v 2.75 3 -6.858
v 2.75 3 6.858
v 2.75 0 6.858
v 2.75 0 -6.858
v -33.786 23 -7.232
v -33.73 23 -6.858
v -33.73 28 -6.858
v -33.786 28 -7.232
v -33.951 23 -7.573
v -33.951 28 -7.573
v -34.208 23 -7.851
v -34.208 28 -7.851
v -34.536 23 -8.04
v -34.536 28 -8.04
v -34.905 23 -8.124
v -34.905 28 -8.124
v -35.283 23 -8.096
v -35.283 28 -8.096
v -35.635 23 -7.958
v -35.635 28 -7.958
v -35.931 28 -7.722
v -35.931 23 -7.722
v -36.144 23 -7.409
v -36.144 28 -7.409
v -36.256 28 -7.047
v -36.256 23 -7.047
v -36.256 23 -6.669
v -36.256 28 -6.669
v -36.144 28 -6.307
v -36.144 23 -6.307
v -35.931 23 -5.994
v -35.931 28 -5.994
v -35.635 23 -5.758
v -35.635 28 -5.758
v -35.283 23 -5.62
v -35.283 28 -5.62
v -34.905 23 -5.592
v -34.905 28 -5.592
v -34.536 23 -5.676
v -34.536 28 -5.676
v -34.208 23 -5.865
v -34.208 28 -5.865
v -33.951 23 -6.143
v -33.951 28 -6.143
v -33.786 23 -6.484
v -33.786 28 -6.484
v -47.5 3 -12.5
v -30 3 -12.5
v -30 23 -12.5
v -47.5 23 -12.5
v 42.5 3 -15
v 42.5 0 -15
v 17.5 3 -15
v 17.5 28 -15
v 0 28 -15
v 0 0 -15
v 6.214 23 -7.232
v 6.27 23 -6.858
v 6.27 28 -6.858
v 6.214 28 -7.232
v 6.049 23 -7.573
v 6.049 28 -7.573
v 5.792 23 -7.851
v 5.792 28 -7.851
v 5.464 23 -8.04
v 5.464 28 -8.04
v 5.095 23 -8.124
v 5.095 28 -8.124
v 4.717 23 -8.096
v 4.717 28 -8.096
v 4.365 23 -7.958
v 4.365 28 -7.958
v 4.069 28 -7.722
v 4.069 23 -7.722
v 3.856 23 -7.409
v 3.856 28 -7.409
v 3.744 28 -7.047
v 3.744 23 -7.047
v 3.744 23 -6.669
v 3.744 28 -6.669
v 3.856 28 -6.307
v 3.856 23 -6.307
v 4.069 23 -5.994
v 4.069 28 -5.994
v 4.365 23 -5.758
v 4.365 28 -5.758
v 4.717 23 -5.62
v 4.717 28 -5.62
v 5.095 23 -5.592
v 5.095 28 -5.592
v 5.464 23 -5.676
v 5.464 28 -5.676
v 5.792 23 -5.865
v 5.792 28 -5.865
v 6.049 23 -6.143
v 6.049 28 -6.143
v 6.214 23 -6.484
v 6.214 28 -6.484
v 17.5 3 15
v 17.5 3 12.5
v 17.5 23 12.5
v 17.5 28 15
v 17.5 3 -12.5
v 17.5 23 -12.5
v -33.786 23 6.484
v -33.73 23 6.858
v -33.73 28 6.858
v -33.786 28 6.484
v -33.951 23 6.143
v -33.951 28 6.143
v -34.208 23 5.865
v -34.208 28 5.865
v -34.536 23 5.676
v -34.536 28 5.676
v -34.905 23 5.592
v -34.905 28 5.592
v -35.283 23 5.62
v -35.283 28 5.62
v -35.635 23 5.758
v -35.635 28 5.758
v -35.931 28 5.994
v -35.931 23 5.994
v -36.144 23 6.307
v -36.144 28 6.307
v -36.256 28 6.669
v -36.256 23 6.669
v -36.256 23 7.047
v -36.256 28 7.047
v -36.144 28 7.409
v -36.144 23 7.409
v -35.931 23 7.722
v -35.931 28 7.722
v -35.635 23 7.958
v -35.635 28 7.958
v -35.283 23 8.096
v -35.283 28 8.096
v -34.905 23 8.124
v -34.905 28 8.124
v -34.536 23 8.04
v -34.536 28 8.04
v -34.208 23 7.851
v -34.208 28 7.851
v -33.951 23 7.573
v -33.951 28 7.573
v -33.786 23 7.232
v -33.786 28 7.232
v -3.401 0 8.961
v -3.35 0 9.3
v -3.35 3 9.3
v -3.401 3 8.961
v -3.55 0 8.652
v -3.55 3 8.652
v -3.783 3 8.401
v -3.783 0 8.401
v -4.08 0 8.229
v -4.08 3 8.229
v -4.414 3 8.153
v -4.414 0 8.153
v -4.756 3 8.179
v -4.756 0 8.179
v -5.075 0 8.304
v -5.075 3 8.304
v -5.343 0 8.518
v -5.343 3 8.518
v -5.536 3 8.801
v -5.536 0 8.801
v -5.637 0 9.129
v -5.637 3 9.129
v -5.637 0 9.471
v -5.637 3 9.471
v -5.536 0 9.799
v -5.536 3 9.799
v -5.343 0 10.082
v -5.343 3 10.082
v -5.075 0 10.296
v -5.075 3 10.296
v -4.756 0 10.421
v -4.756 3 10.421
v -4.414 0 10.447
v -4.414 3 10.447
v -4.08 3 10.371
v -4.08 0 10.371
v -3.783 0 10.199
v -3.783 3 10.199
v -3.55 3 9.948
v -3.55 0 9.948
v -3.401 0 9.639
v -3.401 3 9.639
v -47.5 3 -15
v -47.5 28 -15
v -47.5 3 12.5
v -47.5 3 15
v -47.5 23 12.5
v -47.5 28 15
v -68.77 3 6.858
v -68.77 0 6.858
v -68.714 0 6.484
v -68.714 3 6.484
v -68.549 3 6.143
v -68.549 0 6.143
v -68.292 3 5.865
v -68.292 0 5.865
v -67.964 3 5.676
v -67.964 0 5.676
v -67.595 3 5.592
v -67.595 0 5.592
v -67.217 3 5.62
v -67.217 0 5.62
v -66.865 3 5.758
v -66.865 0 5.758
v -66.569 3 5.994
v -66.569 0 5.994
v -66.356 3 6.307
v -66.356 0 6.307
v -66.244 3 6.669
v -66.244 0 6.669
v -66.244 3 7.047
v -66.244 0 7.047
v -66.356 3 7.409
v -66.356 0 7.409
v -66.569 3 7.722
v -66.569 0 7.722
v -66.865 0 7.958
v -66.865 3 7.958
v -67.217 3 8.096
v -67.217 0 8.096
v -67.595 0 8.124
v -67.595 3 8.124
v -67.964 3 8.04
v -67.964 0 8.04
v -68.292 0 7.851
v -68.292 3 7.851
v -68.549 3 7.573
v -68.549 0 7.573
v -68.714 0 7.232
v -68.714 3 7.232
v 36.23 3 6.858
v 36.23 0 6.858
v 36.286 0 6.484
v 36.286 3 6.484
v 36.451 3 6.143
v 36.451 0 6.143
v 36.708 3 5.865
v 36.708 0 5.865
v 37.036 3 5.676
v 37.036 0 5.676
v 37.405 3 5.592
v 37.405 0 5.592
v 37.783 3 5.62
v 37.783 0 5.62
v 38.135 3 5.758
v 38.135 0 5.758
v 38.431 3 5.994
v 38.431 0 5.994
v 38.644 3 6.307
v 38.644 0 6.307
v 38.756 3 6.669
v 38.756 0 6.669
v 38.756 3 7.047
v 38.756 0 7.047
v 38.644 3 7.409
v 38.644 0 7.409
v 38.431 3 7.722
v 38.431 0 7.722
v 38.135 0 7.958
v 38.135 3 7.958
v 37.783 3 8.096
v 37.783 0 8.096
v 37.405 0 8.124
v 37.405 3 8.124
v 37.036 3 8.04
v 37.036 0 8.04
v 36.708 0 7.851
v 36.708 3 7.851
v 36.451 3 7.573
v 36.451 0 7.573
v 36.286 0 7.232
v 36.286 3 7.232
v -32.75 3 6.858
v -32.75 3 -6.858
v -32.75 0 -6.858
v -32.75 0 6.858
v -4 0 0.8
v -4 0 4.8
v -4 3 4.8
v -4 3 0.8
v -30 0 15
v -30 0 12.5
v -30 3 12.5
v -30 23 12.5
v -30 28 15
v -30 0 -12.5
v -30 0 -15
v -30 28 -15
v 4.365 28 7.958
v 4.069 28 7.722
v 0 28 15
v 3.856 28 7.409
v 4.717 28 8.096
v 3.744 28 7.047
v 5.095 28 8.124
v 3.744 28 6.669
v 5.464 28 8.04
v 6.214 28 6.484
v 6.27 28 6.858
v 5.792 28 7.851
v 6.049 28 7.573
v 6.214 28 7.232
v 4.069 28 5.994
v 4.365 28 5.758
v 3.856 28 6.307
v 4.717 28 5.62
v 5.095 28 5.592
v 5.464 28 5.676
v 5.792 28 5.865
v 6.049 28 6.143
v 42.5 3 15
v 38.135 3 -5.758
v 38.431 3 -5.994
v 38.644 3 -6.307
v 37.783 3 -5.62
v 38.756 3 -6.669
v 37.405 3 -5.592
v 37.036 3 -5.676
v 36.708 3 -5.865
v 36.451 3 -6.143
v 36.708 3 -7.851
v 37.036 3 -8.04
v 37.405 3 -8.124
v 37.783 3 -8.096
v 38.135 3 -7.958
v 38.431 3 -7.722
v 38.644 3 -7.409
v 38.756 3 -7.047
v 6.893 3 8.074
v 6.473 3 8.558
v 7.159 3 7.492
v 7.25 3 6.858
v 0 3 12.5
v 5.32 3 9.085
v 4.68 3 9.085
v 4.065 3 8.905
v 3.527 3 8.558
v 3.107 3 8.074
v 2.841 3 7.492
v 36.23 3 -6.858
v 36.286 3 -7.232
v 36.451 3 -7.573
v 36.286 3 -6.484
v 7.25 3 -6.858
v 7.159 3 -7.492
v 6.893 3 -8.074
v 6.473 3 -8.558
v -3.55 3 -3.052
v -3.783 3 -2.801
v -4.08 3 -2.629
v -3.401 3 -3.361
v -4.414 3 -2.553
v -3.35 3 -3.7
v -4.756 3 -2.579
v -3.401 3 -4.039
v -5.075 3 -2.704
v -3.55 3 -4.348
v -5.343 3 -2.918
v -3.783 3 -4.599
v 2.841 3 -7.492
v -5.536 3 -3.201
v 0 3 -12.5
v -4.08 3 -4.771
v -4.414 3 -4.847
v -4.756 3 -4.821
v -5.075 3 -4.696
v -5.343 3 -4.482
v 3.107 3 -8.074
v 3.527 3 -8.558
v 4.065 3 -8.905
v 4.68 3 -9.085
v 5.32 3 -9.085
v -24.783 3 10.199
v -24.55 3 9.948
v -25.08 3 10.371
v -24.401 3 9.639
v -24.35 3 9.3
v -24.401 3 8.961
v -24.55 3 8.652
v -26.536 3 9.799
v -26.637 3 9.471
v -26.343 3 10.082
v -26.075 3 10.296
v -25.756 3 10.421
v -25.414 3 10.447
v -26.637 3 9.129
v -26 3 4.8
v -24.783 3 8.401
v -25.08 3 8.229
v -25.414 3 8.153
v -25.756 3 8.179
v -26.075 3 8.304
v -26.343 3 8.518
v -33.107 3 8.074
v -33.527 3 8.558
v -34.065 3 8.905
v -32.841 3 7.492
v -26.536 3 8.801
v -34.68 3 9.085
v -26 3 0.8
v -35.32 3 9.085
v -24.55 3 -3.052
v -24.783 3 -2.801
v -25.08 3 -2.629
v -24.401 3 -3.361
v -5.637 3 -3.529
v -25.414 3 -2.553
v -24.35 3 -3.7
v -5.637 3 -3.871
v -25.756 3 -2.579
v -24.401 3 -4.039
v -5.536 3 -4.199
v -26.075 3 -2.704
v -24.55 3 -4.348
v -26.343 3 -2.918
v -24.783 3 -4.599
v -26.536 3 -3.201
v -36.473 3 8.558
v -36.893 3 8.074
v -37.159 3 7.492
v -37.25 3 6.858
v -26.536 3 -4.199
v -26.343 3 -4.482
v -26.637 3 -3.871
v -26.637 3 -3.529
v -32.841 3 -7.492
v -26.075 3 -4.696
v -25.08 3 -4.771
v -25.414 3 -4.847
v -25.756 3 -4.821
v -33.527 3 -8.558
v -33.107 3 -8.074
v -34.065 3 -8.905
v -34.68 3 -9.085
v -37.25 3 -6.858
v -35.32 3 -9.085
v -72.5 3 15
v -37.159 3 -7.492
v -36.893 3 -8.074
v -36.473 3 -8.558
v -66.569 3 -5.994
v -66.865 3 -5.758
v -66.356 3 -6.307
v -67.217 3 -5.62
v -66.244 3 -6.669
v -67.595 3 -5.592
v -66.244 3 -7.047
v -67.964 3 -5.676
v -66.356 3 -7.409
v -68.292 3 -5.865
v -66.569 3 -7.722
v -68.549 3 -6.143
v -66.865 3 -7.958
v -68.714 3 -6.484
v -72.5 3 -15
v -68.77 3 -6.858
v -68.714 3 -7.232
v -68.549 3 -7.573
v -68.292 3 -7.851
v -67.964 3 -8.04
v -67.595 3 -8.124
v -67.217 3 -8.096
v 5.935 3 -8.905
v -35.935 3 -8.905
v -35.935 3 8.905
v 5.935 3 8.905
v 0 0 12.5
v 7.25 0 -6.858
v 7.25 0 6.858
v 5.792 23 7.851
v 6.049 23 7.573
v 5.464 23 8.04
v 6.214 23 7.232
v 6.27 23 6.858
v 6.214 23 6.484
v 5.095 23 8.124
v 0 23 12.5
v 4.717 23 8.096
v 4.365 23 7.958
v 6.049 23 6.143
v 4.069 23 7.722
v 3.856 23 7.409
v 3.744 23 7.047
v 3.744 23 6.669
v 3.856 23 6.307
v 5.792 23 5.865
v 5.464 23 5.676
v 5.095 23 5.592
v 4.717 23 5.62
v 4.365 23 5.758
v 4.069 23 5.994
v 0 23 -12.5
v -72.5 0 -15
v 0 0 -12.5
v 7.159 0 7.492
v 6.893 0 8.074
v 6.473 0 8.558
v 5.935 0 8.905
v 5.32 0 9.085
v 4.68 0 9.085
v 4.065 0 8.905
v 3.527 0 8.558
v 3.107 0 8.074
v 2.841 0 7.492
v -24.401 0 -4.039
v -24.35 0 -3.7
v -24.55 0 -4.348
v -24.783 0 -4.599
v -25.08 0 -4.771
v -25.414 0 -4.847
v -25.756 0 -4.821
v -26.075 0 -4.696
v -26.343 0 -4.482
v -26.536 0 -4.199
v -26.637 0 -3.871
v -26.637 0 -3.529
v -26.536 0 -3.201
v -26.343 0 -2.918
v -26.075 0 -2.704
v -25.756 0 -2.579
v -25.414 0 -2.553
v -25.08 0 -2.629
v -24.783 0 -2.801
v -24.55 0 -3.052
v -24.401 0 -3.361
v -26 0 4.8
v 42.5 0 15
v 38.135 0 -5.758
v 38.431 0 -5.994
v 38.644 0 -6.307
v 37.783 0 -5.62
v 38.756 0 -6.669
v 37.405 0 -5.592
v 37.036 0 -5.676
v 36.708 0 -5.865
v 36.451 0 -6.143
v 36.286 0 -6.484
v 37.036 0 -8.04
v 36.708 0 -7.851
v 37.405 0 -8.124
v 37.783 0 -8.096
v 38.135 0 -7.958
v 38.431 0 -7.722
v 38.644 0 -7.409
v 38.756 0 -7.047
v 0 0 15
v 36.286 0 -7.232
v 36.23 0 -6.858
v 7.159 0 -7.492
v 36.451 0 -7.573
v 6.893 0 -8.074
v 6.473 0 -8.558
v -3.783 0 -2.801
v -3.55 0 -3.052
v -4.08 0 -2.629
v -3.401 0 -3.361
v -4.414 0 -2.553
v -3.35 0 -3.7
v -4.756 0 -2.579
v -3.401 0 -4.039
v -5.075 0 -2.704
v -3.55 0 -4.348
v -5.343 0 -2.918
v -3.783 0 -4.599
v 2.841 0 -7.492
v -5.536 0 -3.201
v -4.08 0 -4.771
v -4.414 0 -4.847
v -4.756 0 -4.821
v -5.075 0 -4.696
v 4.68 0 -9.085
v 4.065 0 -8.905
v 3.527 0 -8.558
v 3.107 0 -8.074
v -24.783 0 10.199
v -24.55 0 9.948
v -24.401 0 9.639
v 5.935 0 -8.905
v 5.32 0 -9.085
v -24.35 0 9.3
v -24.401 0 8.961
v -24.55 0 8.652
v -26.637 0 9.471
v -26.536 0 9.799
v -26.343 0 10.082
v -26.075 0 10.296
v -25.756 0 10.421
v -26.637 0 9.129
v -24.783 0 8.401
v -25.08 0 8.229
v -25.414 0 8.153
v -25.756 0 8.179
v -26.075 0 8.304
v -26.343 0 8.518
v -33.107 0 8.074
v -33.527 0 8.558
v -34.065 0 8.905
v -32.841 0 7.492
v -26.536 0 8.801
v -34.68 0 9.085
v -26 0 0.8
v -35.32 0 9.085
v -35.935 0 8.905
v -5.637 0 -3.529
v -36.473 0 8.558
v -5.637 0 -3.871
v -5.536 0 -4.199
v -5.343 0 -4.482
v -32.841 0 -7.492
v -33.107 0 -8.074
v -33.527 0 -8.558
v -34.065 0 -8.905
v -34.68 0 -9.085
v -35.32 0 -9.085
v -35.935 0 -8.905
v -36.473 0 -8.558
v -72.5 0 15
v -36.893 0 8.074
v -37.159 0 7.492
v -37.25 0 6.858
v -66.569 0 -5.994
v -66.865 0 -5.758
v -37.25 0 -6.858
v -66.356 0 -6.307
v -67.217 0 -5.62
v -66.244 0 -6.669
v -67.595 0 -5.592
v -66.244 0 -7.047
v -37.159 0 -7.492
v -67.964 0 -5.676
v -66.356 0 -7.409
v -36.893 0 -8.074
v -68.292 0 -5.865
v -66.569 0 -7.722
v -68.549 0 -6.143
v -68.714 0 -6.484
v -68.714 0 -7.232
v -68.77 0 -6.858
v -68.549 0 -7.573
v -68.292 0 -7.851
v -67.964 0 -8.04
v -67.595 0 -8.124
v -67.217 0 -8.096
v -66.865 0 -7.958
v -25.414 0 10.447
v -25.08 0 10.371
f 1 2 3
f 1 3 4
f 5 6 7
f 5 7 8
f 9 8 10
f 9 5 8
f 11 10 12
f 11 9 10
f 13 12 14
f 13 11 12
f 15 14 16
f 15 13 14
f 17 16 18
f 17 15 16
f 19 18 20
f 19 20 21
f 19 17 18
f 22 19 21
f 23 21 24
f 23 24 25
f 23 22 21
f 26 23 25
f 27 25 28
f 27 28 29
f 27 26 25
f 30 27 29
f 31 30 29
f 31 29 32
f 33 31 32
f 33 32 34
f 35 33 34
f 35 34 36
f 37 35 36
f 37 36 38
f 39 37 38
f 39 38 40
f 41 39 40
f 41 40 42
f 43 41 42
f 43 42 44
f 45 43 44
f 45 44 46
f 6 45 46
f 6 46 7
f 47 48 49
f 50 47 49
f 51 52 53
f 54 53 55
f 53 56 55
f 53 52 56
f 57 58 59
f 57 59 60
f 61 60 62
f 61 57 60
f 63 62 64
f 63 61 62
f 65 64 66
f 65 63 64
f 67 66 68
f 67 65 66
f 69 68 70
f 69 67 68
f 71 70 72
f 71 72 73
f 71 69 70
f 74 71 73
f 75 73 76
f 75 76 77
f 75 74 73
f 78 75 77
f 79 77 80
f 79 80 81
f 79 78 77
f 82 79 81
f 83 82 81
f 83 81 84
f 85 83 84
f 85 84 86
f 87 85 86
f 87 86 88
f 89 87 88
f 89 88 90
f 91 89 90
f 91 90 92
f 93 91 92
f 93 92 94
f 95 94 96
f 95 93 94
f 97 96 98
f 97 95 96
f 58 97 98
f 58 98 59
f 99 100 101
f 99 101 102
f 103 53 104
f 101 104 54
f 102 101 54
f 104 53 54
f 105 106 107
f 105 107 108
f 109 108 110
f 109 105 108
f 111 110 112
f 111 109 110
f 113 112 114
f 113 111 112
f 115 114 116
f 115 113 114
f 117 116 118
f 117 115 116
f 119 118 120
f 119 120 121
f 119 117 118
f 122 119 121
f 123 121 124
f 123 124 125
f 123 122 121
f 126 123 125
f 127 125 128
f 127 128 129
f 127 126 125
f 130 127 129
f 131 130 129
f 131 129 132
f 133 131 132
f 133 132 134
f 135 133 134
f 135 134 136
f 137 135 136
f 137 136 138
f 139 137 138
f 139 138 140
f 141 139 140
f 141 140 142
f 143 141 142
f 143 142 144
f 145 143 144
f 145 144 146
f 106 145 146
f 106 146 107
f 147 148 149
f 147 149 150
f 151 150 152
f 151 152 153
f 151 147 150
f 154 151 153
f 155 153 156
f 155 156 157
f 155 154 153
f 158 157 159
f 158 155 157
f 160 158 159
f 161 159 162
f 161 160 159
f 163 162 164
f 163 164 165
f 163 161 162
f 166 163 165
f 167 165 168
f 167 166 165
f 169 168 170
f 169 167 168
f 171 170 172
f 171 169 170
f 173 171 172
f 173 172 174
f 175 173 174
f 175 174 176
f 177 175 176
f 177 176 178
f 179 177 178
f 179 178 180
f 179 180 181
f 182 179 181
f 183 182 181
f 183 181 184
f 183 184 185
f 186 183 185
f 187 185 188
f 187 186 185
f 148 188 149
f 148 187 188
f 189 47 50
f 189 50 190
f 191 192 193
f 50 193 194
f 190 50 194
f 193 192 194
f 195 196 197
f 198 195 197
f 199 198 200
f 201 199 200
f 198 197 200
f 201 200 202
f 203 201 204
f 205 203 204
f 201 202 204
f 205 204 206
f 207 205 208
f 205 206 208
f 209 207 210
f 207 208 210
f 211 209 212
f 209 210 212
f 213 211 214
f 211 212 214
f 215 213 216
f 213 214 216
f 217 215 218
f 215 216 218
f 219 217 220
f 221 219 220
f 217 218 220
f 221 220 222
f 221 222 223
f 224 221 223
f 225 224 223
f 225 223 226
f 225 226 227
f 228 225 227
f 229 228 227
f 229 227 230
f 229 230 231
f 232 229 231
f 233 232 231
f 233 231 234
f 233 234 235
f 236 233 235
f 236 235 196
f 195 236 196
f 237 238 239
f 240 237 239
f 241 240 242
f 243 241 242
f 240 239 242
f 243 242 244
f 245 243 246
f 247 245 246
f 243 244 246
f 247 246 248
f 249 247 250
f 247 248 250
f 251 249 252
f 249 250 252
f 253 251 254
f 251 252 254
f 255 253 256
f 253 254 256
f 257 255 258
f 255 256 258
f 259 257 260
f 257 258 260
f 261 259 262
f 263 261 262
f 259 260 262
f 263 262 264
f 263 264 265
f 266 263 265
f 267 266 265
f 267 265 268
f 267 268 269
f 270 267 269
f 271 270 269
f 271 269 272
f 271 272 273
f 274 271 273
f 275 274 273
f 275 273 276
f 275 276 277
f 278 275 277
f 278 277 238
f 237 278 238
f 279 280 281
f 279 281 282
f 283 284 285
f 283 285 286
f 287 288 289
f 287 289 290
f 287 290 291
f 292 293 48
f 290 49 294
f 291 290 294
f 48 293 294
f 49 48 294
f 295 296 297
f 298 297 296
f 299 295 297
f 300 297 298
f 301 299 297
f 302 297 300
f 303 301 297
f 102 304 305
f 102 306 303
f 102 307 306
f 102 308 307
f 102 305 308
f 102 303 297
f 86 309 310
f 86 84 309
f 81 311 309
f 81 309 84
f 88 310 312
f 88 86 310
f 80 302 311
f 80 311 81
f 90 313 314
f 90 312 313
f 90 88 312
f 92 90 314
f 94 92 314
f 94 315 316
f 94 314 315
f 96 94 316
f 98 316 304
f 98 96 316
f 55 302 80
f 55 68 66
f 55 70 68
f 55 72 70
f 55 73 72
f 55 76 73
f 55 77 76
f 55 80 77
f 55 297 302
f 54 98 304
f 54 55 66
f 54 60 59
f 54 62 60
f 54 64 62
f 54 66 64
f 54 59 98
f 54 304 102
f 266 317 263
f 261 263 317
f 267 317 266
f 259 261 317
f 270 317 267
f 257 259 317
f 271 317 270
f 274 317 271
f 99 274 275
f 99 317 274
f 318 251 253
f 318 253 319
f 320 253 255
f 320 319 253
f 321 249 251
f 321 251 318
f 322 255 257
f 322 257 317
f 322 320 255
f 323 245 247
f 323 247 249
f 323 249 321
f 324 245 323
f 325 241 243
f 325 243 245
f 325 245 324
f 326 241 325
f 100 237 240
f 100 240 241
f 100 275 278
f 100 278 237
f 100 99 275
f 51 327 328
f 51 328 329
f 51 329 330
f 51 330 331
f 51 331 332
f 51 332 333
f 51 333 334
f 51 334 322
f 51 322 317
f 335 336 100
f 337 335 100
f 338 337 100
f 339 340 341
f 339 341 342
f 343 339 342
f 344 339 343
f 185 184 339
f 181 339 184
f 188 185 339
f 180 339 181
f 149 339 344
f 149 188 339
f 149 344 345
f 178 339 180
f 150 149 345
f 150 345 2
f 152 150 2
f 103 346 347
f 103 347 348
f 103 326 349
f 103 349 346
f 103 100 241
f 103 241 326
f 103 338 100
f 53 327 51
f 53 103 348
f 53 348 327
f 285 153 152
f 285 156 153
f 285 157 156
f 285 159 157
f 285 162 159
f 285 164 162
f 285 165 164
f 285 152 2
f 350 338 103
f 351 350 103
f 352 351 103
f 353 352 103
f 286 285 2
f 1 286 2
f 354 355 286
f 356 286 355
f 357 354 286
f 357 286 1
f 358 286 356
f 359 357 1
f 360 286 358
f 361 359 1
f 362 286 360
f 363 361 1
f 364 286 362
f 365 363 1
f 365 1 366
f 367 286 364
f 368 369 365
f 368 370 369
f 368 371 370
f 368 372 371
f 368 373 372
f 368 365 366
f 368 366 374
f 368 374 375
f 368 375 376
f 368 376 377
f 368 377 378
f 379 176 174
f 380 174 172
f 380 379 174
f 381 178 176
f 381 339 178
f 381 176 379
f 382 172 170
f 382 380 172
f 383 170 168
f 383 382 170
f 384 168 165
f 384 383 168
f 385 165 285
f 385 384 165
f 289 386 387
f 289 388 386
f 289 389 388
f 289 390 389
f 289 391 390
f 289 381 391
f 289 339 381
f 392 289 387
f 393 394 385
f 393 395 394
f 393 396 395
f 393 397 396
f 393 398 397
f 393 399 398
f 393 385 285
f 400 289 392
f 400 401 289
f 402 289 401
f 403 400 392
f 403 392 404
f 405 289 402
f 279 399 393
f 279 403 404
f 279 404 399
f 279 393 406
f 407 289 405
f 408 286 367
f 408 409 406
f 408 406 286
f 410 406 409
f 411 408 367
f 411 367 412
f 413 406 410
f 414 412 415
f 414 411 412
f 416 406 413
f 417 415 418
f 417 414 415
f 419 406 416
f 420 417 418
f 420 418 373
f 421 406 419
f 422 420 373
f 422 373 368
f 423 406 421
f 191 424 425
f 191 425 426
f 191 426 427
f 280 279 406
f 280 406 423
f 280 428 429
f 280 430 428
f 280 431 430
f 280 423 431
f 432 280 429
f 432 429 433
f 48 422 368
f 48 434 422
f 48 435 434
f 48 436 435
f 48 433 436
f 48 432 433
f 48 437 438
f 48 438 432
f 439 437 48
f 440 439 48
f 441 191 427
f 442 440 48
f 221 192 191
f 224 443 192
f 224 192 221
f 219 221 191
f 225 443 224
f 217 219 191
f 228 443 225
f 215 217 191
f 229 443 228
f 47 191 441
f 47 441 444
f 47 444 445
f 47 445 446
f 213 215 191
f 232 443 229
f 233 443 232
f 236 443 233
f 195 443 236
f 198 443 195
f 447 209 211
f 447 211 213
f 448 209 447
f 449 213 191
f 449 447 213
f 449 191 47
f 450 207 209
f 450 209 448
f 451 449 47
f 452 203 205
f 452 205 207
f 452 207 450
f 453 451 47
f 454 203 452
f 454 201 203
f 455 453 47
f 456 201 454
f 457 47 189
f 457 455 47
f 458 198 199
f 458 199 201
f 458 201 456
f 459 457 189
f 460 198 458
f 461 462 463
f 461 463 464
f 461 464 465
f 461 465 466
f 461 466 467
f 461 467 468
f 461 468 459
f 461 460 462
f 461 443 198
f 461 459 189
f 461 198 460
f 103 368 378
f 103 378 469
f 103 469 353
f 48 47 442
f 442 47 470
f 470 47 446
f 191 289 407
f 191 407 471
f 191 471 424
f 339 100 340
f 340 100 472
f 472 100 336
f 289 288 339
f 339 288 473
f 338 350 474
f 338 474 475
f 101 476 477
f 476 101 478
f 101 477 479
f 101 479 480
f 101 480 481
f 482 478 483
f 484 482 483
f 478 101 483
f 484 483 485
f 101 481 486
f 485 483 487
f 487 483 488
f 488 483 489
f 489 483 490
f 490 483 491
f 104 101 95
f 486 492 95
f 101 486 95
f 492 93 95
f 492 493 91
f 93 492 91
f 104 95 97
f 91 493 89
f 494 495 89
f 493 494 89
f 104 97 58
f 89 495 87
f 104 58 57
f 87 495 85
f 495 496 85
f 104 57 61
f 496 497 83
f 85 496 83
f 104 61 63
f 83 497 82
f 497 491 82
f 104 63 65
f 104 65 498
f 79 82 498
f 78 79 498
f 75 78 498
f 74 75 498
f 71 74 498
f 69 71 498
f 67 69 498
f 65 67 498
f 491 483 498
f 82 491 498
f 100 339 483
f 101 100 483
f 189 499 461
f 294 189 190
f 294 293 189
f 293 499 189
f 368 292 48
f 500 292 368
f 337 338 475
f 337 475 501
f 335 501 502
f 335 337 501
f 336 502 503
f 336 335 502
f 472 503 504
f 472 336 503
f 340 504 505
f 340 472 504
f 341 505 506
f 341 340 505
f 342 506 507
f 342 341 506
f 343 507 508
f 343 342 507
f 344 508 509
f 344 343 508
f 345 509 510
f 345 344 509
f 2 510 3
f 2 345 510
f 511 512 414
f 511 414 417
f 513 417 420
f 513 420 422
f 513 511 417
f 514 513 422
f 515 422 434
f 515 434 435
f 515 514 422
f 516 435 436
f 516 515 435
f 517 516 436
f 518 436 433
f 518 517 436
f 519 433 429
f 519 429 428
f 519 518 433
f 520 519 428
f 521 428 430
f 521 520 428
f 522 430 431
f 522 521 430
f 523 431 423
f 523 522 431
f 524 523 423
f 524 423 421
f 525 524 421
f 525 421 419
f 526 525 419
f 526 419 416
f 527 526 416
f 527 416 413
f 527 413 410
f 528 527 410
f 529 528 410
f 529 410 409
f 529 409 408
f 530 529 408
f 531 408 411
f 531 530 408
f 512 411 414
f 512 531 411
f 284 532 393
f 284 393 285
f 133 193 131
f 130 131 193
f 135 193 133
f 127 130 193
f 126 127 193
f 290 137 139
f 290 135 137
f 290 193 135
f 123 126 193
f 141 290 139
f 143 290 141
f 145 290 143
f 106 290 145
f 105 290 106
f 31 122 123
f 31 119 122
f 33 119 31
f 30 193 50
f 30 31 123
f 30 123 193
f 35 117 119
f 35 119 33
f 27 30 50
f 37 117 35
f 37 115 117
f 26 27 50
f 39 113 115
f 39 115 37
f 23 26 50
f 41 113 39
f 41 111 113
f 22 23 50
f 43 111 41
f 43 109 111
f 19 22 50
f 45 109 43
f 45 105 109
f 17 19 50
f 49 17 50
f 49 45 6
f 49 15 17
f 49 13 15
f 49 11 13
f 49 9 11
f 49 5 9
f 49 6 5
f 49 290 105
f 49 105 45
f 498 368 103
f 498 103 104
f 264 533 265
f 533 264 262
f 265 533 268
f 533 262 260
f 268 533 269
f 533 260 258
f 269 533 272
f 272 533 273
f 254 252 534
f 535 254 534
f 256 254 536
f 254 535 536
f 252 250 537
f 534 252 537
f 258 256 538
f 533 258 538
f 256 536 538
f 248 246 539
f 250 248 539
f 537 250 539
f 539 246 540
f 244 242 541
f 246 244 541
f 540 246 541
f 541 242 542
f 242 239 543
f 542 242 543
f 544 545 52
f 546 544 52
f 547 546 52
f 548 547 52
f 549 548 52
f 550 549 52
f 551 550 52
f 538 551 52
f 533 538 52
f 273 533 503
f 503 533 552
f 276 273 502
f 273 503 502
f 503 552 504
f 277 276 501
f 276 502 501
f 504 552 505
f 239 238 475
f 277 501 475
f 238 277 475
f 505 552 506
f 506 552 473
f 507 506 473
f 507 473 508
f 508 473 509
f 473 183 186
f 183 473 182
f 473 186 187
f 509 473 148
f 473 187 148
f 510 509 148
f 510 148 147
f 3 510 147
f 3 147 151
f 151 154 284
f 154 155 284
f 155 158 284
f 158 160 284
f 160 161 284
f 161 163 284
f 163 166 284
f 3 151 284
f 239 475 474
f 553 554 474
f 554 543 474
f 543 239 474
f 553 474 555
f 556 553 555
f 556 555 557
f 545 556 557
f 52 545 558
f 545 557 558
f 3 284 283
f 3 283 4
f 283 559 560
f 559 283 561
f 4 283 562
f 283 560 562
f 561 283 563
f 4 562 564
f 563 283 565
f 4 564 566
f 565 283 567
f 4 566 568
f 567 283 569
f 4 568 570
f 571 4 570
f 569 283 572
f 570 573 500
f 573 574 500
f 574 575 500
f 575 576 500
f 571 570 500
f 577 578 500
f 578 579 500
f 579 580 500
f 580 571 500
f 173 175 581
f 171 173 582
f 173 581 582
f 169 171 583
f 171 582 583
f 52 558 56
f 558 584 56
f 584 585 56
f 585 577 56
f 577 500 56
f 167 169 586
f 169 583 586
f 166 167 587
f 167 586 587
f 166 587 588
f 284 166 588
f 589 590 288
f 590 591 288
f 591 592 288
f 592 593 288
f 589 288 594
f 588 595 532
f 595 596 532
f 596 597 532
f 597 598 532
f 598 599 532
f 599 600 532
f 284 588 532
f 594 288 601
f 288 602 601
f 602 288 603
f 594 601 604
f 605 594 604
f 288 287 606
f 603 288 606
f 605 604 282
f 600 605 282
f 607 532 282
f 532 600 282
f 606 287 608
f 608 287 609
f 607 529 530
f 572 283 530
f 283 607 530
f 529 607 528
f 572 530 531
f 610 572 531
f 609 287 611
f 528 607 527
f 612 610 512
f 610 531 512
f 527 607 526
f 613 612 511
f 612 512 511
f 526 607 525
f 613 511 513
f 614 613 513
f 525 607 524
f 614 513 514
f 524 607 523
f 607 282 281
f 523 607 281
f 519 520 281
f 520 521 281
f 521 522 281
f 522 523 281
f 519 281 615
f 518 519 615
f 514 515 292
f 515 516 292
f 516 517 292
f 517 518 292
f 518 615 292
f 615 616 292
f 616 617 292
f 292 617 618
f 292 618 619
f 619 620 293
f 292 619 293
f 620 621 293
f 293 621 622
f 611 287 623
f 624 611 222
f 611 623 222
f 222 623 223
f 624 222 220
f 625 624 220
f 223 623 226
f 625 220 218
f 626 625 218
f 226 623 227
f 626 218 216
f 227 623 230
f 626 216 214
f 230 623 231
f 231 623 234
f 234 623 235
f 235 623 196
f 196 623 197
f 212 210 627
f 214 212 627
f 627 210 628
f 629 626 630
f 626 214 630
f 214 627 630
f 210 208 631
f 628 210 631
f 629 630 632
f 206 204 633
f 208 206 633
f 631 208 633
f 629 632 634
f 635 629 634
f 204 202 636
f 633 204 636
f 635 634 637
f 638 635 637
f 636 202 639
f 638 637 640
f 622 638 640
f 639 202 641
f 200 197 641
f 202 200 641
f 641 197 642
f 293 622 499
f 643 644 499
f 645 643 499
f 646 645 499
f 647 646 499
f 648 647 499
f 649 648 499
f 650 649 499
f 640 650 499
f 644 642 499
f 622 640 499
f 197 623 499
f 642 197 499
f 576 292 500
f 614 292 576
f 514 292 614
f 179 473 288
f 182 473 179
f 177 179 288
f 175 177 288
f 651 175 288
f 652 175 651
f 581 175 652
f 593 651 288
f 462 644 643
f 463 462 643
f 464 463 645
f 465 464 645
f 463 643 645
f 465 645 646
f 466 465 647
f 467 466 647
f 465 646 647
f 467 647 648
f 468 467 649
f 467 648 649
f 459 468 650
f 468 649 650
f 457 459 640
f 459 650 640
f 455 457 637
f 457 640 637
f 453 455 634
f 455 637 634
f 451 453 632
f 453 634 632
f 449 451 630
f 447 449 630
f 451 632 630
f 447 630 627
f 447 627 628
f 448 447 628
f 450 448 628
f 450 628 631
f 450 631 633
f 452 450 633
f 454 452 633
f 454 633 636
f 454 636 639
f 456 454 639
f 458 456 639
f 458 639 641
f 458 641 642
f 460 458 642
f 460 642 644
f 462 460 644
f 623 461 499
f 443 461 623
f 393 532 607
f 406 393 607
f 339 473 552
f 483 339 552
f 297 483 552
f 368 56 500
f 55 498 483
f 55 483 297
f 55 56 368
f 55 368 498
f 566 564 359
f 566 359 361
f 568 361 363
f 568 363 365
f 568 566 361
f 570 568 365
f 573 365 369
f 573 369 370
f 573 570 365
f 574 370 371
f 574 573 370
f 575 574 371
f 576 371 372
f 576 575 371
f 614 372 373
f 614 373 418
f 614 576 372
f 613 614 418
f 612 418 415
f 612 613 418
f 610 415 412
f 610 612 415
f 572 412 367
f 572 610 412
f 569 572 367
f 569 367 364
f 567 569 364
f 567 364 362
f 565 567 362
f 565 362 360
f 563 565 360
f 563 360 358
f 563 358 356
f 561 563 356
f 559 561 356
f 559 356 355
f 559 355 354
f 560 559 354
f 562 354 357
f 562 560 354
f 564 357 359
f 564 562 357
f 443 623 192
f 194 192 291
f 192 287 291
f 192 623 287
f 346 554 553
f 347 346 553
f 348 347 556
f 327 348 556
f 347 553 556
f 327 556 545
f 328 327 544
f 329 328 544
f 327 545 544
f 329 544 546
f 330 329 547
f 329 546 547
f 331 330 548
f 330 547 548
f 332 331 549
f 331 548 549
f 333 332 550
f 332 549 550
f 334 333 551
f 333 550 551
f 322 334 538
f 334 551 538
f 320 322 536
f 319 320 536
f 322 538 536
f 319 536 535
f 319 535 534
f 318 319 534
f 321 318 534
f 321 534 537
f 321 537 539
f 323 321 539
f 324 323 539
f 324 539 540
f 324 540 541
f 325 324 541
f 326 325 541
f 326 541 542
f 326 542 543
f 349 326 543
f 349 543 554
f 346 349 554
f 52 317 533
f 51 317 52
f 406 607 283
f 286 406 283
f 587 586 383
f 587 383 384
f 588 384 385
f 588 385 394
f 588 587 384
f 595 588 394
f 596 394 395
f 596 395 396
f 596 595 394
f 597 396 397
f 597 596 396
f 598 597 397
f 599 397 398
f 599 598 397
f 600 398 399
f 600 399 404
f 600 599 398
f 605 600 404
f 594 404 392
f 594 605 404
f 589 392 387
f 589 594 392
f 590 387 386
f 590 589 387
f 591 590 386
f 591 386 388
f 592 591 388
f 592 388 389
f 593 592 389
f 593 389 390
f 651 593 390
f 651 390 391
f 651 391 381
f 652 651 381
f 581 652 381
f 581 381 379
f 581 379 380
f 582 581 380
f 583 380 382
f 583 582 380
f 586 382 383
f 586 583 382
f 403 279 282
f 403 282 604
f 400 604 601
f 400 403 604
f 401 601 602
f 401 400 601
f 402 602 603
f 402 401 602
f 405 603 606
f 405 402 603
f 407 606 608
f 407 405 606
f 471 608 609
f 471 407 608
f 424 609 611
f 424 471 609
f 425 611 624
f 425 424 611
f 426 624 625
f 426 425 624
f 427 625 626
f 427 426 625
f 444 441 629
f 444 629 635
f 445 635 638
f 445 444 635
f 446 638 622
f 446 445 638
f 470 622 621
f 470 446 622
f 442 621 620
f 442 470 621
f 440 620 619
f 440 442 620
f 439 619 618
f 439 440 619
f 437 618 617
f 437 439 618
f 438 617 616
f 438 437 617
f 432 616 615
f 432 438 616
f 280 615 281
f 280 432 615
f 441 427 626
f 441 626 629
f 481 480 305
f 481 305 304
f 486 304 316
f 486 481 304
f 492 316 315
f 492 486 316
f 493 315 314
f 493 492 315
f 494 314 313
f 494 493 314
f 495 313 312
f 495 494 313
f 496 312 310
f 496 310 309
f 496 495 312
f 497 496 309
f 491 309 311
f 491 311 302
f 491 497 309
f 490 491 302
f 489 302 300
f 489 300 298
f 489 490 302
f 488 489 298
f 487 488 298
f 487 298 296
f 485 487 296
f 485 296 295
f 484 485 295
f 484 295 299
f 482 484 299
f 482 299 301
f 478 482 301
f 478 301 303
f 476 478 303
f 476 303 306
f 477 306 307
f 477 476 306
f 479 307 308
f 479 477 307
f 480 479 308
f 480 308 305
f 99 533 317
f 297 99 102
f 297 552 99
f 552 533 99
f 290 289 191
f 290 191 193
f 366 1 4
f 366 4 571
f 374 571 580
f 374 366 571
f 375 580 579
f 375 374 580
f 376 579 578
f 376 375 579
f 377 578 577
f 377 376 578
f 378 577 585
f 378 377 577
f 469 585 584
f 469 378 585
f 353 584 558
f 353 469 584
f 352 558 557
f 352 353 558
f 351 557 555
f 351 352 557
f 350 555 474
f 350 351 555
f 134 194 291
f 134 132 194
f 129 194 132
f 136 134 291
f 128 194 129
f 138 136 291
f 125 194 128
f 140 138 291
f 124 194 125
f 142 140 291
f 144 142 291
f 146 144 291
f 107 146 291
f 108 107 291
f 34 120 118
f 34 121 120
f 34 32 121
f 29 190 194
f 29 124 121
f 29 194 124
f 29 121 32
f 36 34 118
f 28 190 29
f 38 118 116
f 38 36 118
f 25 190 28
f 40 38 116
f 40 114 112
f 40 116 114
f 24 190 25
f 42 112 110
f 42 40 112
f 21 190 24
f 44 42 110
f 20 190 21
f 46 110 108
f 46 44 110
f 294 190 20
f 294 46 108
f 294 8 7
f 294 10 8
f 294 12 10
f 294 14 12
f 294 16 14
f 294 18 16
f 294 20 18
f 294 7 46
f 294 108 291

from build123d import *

# Parameters (mm, degrees)
SKETCH1_W                         = 30
SKETCH1_H                         = 25
SKETCH1_R                         = 1.15
SKETCH1_W_2                       = 22
SKETCH1_H_2                       = 4
BOSS_EXTRUDE1_DEPTH               = 3
SKETCH2_W                         = 7.5
SKETCH2_H                         = 20
SKETCH2_R                         = 1.27
BOSS_EXTRUDE2_DEPTH               = 3
SKETCH6_W                         = 20
SKETCH6_H                         = 3
BOSS_EXTRUDE3_DEPTH               = 10
SKETCH7_W                         = 20
SKETCH7_H                         = 3
BOSS_EXTRUDE4_DEPTH               = 10
SKETCH8_W                         = 17.5
SKETCH8_H                         = 20
SKETCH8_R                         = 1.27
BOSS_EXTRUDE5_DEPTH               = 25
SKETCH13_W                        = 17.5
SKETCH13_H                        = 28
BOSS_EXTRUDE6_DEPTH               = 5
SKETCH14_W                        = 17.5
SKETCH14_H                        = 28
BOSS_EXTRUDE7_DEPTH               = 5
SKETCH15_W                        = 25
SKETCH15_H                        = 20
CUT_EXTRUDE2_DEPTH                = 48.5
CUT_EXTRUDE2_DEPTH_BACK           = 18.5
SKETCH16_W                        = 30
SKETCH16_H                        = 3
BOSS_EXTRUDE8_DEPTH               = 25
SKETCH19_W                        = 30
SKETCH19_H                        = 3
BOSS_EXTRUDE9_DEPTH               = 25
F_1_16_0_0625_PRESS_DOWEL_HOLE1_D = 2.54
CUT_EXTRUDE3_DEPTH                = 4


with BuildPart() as part:
    # Sketch1 → Boss-Extrude1 (new body)
    with BuildSketch(Plane(origin=(0, 0, 0), x_dir=(1, 0, 0), z_dir=(0, 1, 0))):
        with Locations((-15, 0)):
            Rectangle(SKETCH1_W, SKETCH1_H)
        with Locations((-4.5, 3.7)):
            Circle(SKETCH1_R, mode=Mode.SUBTRACT)
        with Locations((-4.5, -9.3)):
            Circle(SKETCH1_R, mode=Mode.SUBTRACT)
        with Locations((-25.5, 3.7)):
            Circle(SKETCH1_R, mode=Mode.SUBTRACT)
        with Locations((-25.5, -9.3)):
            Circle(SKETCH1_R, mode=Mode.SUBTRACT)
        with Locations((-15, -2.8)):
            Rectangle(SKETCH1_W_2, SKETCH1_H_2, mode=Mode.SUBTRACT)
    extrude(amount=BOSS_EXTRUDE1_DEPTH)

    # Sketch2 → Boss-Extrude2 (add)
    with BuildSketch(Plane(origin=(0, 3, 0), x_dir=(1, 0, 0), z_dir=(0, 1, 0))):
        with Locations((3.75, 0)):
            Rectangle(SKETCH2_W, SKETCH2_H)
        with Locations((5, 6.858)):
            Circle(SKETCH2_R, mode=Mode.SUBTRACT)
        with Locations((5, -6.858)):
            Circle(SKETCH2_R, mode=Mode.SUBTRACT)
        with Locations((-33.75, 0)):
            Rectangle(SKETCH2_W, SKETCH2_H)
        with Locations((-35, 6.858)):
            Circle(SKETCH2_R, mode=Mode.SUBTRACT)
        with Locations((-35, -6.858)):
            Circle(SKETCH2_R, mode=Mode.SUBTRACT)
    extrude(amount=-BOSS_EXTRUDE2_DEPTH)

    # Sketch6 → Boss-Extrude3 (add)
    with BuildSketch(Plane.ZY.offset(37.5)):
        with Locations((0, 1.5)):
            Rectangle(SKETCH6_W, SKETCH6_H)
    extrude(amount=BOSS_EXTRUDE3_DEPTH)

    # Sketch7 → Boss-Extrude4 (add)
    with BuildSketch(Plane(origin=(7.5, 0, 0), x_dir=(0, 0, -1), z_dir=(1, 0, 0))):
        with Locations((0, 1.5)):
            Rectangle(SKETCH7_W, SKETCH7_H)
    extrude(amount=BOSS_EXTRUDE4_DEPTH)

    # Sketch8 → Boss-Extrude5 (add)
    with BuildSketch(Plane(origin=(0, 3, 0), x_dir=(1, 0, 0), z_dir=(0, 1, 0))):
        with Locations((8.75, 0)):
            Rectangle(SKETCH8_W, SKETCH8_H)
        with Locations((5, 6.858)):
            Circle(SKETCH8_R, mode=Mode.SUBTRACT)
        with Locations((5, -6.858)):
            Circle(SKETCH8_R, mode=Mode.SUBTRACT)
        with Locations((-38.75, 0)):
            Rectangle(SKETCH8_W, SKETCH8_H)
        with Locations((-35, -6.858)):
            Circle(SKETCH8_R, mode=Mode.SUBTRACT)
        with Locations((-35, 6.858)):
            Circle(SKETCH8_R, mode=Mode.SUBTRACT)
    extrude(amount=BOSS_EXTRUDE5_DEPTH)

    # Sketch13 → Boss-Extrude6 (add)
    with BuildSketch(Plane(origin=(0, 0, -10), x_dir=(-1, 0, 0), z_dir=(0, 0, -1))):
        with Locations((38.75, 14)):
            Rectangle(SKETCH13_W, SKETCH13_H)
        with Locations((-8.75, 14)):
            Rectangle(SKETCH13_W, SKETCH13_H)
    extrude(amount=BOSS_EXTRUDE6_DEPTH)

    # Sketch14 → Boss-Extrude7 (add)
    with BuildSketch(Plane.XY.offset(10)):
        with Locations((8.75, 14)):
            Rectangle(SKETCH14_W, SKETCH14_H)
        with Locations((-38.75, 14)):
            Rectangle(SKETCH14_W, SKETCH14_H)
    extrude(amount=BOSS_EXTRUDE7_DEPTH)

    # Sketch15 → Cut-Extrude2 (cut, two sides)
    with BuildSketch(Plane(origin=(-30, 0, 0), x_dir=(0, 0, -1), z_dir=(1, 0, 0))) as cut_extrude2_sk:
        with Locations((0, 13)):
            Rectangle(SKETCH15_W, SKETCH15_H)
    extrude(amount=CUT_EXTRUDE2_DEPTH, mode=Mode.SUBTRACT)
    extrude(cut_extrude2_sk.sketch, amount=-CUT_EXTRUDE2_DEPTH_BACK, mode=Mode.SUBTRACT)

    # Sketch16 → Boss-Extrude8 (add)
    with BuildSketch(Plane.ZY.offset(47.5)):
        with Locations((0, 1.5)):
            Rectangle(SKETCH16_W, SKETCH16_H)
    extrude(amount=BOSS_EXTRUDE8_DEPTH)

    # Sketch19 → Boss-Extrude9 (add)
    with BuildSketch(Plane(origin=(17.5, 0, 0), x_dir=(0, 0, -1), z_dir=(1, 0, 0))):
        with Locations((0, 1.5)):
            Rectangle(SKETCH19_W, SKETCH19_H)
    extrude(amount=BOSS_EXTRUDE9_DEPTH)

    # 1/16 (0.0625) Press Dowel Hole1 (through all)
    with Locations(Plane(origin=(0, 3, 0), x_dir=(1, 0, 0), z_dir=(0, 1, 0))):
        with Locations((-67.5, 6.858), (-67.5, -6.858), (37.5, -6.858), (37.5, 6.858)):
            Hole(F_1_16_0_0625_PRESS_DOWEL_HOLE1_D / 2)

    # Sketch21 → Cut-Extrude3 (cut, through all)
    with BuildSketch(Plane(origin=(0, 3, 0), x_dir=(1, 0, 0), z_dir=(0, 1, 0))):
        with BuildLine():
            Line((2.75, -6.858), (2.75, 6.858))
            ThreePointArc((2.75, 6.858), (5, 9.108), (7.25, 6.858))
            Line((7.25, 6.858), (7.25, -6.858))
            ThreePointArc((7.25, -6.858), (5, -9.108), (2.75, -6.858))
        make_face()
        with BuildLine():
            Line((-32.75, 6.858), (-32.75, -6.858))
            ThreePointArc((-32.75, -6.858), (-35, -9.108), (-37.25, -6.858))
            Line((-37.25, -6.858), (-37.25, 6.858))
            ThreePointArc((-37.25, 6.858), (-35, 9.108), (-32.75, 6.858))
        make_face()
    extrude(amount=-CUT_EXTRUDE3_DEPTH, mode=Mode.SUBTRACT)


solid = part.part
